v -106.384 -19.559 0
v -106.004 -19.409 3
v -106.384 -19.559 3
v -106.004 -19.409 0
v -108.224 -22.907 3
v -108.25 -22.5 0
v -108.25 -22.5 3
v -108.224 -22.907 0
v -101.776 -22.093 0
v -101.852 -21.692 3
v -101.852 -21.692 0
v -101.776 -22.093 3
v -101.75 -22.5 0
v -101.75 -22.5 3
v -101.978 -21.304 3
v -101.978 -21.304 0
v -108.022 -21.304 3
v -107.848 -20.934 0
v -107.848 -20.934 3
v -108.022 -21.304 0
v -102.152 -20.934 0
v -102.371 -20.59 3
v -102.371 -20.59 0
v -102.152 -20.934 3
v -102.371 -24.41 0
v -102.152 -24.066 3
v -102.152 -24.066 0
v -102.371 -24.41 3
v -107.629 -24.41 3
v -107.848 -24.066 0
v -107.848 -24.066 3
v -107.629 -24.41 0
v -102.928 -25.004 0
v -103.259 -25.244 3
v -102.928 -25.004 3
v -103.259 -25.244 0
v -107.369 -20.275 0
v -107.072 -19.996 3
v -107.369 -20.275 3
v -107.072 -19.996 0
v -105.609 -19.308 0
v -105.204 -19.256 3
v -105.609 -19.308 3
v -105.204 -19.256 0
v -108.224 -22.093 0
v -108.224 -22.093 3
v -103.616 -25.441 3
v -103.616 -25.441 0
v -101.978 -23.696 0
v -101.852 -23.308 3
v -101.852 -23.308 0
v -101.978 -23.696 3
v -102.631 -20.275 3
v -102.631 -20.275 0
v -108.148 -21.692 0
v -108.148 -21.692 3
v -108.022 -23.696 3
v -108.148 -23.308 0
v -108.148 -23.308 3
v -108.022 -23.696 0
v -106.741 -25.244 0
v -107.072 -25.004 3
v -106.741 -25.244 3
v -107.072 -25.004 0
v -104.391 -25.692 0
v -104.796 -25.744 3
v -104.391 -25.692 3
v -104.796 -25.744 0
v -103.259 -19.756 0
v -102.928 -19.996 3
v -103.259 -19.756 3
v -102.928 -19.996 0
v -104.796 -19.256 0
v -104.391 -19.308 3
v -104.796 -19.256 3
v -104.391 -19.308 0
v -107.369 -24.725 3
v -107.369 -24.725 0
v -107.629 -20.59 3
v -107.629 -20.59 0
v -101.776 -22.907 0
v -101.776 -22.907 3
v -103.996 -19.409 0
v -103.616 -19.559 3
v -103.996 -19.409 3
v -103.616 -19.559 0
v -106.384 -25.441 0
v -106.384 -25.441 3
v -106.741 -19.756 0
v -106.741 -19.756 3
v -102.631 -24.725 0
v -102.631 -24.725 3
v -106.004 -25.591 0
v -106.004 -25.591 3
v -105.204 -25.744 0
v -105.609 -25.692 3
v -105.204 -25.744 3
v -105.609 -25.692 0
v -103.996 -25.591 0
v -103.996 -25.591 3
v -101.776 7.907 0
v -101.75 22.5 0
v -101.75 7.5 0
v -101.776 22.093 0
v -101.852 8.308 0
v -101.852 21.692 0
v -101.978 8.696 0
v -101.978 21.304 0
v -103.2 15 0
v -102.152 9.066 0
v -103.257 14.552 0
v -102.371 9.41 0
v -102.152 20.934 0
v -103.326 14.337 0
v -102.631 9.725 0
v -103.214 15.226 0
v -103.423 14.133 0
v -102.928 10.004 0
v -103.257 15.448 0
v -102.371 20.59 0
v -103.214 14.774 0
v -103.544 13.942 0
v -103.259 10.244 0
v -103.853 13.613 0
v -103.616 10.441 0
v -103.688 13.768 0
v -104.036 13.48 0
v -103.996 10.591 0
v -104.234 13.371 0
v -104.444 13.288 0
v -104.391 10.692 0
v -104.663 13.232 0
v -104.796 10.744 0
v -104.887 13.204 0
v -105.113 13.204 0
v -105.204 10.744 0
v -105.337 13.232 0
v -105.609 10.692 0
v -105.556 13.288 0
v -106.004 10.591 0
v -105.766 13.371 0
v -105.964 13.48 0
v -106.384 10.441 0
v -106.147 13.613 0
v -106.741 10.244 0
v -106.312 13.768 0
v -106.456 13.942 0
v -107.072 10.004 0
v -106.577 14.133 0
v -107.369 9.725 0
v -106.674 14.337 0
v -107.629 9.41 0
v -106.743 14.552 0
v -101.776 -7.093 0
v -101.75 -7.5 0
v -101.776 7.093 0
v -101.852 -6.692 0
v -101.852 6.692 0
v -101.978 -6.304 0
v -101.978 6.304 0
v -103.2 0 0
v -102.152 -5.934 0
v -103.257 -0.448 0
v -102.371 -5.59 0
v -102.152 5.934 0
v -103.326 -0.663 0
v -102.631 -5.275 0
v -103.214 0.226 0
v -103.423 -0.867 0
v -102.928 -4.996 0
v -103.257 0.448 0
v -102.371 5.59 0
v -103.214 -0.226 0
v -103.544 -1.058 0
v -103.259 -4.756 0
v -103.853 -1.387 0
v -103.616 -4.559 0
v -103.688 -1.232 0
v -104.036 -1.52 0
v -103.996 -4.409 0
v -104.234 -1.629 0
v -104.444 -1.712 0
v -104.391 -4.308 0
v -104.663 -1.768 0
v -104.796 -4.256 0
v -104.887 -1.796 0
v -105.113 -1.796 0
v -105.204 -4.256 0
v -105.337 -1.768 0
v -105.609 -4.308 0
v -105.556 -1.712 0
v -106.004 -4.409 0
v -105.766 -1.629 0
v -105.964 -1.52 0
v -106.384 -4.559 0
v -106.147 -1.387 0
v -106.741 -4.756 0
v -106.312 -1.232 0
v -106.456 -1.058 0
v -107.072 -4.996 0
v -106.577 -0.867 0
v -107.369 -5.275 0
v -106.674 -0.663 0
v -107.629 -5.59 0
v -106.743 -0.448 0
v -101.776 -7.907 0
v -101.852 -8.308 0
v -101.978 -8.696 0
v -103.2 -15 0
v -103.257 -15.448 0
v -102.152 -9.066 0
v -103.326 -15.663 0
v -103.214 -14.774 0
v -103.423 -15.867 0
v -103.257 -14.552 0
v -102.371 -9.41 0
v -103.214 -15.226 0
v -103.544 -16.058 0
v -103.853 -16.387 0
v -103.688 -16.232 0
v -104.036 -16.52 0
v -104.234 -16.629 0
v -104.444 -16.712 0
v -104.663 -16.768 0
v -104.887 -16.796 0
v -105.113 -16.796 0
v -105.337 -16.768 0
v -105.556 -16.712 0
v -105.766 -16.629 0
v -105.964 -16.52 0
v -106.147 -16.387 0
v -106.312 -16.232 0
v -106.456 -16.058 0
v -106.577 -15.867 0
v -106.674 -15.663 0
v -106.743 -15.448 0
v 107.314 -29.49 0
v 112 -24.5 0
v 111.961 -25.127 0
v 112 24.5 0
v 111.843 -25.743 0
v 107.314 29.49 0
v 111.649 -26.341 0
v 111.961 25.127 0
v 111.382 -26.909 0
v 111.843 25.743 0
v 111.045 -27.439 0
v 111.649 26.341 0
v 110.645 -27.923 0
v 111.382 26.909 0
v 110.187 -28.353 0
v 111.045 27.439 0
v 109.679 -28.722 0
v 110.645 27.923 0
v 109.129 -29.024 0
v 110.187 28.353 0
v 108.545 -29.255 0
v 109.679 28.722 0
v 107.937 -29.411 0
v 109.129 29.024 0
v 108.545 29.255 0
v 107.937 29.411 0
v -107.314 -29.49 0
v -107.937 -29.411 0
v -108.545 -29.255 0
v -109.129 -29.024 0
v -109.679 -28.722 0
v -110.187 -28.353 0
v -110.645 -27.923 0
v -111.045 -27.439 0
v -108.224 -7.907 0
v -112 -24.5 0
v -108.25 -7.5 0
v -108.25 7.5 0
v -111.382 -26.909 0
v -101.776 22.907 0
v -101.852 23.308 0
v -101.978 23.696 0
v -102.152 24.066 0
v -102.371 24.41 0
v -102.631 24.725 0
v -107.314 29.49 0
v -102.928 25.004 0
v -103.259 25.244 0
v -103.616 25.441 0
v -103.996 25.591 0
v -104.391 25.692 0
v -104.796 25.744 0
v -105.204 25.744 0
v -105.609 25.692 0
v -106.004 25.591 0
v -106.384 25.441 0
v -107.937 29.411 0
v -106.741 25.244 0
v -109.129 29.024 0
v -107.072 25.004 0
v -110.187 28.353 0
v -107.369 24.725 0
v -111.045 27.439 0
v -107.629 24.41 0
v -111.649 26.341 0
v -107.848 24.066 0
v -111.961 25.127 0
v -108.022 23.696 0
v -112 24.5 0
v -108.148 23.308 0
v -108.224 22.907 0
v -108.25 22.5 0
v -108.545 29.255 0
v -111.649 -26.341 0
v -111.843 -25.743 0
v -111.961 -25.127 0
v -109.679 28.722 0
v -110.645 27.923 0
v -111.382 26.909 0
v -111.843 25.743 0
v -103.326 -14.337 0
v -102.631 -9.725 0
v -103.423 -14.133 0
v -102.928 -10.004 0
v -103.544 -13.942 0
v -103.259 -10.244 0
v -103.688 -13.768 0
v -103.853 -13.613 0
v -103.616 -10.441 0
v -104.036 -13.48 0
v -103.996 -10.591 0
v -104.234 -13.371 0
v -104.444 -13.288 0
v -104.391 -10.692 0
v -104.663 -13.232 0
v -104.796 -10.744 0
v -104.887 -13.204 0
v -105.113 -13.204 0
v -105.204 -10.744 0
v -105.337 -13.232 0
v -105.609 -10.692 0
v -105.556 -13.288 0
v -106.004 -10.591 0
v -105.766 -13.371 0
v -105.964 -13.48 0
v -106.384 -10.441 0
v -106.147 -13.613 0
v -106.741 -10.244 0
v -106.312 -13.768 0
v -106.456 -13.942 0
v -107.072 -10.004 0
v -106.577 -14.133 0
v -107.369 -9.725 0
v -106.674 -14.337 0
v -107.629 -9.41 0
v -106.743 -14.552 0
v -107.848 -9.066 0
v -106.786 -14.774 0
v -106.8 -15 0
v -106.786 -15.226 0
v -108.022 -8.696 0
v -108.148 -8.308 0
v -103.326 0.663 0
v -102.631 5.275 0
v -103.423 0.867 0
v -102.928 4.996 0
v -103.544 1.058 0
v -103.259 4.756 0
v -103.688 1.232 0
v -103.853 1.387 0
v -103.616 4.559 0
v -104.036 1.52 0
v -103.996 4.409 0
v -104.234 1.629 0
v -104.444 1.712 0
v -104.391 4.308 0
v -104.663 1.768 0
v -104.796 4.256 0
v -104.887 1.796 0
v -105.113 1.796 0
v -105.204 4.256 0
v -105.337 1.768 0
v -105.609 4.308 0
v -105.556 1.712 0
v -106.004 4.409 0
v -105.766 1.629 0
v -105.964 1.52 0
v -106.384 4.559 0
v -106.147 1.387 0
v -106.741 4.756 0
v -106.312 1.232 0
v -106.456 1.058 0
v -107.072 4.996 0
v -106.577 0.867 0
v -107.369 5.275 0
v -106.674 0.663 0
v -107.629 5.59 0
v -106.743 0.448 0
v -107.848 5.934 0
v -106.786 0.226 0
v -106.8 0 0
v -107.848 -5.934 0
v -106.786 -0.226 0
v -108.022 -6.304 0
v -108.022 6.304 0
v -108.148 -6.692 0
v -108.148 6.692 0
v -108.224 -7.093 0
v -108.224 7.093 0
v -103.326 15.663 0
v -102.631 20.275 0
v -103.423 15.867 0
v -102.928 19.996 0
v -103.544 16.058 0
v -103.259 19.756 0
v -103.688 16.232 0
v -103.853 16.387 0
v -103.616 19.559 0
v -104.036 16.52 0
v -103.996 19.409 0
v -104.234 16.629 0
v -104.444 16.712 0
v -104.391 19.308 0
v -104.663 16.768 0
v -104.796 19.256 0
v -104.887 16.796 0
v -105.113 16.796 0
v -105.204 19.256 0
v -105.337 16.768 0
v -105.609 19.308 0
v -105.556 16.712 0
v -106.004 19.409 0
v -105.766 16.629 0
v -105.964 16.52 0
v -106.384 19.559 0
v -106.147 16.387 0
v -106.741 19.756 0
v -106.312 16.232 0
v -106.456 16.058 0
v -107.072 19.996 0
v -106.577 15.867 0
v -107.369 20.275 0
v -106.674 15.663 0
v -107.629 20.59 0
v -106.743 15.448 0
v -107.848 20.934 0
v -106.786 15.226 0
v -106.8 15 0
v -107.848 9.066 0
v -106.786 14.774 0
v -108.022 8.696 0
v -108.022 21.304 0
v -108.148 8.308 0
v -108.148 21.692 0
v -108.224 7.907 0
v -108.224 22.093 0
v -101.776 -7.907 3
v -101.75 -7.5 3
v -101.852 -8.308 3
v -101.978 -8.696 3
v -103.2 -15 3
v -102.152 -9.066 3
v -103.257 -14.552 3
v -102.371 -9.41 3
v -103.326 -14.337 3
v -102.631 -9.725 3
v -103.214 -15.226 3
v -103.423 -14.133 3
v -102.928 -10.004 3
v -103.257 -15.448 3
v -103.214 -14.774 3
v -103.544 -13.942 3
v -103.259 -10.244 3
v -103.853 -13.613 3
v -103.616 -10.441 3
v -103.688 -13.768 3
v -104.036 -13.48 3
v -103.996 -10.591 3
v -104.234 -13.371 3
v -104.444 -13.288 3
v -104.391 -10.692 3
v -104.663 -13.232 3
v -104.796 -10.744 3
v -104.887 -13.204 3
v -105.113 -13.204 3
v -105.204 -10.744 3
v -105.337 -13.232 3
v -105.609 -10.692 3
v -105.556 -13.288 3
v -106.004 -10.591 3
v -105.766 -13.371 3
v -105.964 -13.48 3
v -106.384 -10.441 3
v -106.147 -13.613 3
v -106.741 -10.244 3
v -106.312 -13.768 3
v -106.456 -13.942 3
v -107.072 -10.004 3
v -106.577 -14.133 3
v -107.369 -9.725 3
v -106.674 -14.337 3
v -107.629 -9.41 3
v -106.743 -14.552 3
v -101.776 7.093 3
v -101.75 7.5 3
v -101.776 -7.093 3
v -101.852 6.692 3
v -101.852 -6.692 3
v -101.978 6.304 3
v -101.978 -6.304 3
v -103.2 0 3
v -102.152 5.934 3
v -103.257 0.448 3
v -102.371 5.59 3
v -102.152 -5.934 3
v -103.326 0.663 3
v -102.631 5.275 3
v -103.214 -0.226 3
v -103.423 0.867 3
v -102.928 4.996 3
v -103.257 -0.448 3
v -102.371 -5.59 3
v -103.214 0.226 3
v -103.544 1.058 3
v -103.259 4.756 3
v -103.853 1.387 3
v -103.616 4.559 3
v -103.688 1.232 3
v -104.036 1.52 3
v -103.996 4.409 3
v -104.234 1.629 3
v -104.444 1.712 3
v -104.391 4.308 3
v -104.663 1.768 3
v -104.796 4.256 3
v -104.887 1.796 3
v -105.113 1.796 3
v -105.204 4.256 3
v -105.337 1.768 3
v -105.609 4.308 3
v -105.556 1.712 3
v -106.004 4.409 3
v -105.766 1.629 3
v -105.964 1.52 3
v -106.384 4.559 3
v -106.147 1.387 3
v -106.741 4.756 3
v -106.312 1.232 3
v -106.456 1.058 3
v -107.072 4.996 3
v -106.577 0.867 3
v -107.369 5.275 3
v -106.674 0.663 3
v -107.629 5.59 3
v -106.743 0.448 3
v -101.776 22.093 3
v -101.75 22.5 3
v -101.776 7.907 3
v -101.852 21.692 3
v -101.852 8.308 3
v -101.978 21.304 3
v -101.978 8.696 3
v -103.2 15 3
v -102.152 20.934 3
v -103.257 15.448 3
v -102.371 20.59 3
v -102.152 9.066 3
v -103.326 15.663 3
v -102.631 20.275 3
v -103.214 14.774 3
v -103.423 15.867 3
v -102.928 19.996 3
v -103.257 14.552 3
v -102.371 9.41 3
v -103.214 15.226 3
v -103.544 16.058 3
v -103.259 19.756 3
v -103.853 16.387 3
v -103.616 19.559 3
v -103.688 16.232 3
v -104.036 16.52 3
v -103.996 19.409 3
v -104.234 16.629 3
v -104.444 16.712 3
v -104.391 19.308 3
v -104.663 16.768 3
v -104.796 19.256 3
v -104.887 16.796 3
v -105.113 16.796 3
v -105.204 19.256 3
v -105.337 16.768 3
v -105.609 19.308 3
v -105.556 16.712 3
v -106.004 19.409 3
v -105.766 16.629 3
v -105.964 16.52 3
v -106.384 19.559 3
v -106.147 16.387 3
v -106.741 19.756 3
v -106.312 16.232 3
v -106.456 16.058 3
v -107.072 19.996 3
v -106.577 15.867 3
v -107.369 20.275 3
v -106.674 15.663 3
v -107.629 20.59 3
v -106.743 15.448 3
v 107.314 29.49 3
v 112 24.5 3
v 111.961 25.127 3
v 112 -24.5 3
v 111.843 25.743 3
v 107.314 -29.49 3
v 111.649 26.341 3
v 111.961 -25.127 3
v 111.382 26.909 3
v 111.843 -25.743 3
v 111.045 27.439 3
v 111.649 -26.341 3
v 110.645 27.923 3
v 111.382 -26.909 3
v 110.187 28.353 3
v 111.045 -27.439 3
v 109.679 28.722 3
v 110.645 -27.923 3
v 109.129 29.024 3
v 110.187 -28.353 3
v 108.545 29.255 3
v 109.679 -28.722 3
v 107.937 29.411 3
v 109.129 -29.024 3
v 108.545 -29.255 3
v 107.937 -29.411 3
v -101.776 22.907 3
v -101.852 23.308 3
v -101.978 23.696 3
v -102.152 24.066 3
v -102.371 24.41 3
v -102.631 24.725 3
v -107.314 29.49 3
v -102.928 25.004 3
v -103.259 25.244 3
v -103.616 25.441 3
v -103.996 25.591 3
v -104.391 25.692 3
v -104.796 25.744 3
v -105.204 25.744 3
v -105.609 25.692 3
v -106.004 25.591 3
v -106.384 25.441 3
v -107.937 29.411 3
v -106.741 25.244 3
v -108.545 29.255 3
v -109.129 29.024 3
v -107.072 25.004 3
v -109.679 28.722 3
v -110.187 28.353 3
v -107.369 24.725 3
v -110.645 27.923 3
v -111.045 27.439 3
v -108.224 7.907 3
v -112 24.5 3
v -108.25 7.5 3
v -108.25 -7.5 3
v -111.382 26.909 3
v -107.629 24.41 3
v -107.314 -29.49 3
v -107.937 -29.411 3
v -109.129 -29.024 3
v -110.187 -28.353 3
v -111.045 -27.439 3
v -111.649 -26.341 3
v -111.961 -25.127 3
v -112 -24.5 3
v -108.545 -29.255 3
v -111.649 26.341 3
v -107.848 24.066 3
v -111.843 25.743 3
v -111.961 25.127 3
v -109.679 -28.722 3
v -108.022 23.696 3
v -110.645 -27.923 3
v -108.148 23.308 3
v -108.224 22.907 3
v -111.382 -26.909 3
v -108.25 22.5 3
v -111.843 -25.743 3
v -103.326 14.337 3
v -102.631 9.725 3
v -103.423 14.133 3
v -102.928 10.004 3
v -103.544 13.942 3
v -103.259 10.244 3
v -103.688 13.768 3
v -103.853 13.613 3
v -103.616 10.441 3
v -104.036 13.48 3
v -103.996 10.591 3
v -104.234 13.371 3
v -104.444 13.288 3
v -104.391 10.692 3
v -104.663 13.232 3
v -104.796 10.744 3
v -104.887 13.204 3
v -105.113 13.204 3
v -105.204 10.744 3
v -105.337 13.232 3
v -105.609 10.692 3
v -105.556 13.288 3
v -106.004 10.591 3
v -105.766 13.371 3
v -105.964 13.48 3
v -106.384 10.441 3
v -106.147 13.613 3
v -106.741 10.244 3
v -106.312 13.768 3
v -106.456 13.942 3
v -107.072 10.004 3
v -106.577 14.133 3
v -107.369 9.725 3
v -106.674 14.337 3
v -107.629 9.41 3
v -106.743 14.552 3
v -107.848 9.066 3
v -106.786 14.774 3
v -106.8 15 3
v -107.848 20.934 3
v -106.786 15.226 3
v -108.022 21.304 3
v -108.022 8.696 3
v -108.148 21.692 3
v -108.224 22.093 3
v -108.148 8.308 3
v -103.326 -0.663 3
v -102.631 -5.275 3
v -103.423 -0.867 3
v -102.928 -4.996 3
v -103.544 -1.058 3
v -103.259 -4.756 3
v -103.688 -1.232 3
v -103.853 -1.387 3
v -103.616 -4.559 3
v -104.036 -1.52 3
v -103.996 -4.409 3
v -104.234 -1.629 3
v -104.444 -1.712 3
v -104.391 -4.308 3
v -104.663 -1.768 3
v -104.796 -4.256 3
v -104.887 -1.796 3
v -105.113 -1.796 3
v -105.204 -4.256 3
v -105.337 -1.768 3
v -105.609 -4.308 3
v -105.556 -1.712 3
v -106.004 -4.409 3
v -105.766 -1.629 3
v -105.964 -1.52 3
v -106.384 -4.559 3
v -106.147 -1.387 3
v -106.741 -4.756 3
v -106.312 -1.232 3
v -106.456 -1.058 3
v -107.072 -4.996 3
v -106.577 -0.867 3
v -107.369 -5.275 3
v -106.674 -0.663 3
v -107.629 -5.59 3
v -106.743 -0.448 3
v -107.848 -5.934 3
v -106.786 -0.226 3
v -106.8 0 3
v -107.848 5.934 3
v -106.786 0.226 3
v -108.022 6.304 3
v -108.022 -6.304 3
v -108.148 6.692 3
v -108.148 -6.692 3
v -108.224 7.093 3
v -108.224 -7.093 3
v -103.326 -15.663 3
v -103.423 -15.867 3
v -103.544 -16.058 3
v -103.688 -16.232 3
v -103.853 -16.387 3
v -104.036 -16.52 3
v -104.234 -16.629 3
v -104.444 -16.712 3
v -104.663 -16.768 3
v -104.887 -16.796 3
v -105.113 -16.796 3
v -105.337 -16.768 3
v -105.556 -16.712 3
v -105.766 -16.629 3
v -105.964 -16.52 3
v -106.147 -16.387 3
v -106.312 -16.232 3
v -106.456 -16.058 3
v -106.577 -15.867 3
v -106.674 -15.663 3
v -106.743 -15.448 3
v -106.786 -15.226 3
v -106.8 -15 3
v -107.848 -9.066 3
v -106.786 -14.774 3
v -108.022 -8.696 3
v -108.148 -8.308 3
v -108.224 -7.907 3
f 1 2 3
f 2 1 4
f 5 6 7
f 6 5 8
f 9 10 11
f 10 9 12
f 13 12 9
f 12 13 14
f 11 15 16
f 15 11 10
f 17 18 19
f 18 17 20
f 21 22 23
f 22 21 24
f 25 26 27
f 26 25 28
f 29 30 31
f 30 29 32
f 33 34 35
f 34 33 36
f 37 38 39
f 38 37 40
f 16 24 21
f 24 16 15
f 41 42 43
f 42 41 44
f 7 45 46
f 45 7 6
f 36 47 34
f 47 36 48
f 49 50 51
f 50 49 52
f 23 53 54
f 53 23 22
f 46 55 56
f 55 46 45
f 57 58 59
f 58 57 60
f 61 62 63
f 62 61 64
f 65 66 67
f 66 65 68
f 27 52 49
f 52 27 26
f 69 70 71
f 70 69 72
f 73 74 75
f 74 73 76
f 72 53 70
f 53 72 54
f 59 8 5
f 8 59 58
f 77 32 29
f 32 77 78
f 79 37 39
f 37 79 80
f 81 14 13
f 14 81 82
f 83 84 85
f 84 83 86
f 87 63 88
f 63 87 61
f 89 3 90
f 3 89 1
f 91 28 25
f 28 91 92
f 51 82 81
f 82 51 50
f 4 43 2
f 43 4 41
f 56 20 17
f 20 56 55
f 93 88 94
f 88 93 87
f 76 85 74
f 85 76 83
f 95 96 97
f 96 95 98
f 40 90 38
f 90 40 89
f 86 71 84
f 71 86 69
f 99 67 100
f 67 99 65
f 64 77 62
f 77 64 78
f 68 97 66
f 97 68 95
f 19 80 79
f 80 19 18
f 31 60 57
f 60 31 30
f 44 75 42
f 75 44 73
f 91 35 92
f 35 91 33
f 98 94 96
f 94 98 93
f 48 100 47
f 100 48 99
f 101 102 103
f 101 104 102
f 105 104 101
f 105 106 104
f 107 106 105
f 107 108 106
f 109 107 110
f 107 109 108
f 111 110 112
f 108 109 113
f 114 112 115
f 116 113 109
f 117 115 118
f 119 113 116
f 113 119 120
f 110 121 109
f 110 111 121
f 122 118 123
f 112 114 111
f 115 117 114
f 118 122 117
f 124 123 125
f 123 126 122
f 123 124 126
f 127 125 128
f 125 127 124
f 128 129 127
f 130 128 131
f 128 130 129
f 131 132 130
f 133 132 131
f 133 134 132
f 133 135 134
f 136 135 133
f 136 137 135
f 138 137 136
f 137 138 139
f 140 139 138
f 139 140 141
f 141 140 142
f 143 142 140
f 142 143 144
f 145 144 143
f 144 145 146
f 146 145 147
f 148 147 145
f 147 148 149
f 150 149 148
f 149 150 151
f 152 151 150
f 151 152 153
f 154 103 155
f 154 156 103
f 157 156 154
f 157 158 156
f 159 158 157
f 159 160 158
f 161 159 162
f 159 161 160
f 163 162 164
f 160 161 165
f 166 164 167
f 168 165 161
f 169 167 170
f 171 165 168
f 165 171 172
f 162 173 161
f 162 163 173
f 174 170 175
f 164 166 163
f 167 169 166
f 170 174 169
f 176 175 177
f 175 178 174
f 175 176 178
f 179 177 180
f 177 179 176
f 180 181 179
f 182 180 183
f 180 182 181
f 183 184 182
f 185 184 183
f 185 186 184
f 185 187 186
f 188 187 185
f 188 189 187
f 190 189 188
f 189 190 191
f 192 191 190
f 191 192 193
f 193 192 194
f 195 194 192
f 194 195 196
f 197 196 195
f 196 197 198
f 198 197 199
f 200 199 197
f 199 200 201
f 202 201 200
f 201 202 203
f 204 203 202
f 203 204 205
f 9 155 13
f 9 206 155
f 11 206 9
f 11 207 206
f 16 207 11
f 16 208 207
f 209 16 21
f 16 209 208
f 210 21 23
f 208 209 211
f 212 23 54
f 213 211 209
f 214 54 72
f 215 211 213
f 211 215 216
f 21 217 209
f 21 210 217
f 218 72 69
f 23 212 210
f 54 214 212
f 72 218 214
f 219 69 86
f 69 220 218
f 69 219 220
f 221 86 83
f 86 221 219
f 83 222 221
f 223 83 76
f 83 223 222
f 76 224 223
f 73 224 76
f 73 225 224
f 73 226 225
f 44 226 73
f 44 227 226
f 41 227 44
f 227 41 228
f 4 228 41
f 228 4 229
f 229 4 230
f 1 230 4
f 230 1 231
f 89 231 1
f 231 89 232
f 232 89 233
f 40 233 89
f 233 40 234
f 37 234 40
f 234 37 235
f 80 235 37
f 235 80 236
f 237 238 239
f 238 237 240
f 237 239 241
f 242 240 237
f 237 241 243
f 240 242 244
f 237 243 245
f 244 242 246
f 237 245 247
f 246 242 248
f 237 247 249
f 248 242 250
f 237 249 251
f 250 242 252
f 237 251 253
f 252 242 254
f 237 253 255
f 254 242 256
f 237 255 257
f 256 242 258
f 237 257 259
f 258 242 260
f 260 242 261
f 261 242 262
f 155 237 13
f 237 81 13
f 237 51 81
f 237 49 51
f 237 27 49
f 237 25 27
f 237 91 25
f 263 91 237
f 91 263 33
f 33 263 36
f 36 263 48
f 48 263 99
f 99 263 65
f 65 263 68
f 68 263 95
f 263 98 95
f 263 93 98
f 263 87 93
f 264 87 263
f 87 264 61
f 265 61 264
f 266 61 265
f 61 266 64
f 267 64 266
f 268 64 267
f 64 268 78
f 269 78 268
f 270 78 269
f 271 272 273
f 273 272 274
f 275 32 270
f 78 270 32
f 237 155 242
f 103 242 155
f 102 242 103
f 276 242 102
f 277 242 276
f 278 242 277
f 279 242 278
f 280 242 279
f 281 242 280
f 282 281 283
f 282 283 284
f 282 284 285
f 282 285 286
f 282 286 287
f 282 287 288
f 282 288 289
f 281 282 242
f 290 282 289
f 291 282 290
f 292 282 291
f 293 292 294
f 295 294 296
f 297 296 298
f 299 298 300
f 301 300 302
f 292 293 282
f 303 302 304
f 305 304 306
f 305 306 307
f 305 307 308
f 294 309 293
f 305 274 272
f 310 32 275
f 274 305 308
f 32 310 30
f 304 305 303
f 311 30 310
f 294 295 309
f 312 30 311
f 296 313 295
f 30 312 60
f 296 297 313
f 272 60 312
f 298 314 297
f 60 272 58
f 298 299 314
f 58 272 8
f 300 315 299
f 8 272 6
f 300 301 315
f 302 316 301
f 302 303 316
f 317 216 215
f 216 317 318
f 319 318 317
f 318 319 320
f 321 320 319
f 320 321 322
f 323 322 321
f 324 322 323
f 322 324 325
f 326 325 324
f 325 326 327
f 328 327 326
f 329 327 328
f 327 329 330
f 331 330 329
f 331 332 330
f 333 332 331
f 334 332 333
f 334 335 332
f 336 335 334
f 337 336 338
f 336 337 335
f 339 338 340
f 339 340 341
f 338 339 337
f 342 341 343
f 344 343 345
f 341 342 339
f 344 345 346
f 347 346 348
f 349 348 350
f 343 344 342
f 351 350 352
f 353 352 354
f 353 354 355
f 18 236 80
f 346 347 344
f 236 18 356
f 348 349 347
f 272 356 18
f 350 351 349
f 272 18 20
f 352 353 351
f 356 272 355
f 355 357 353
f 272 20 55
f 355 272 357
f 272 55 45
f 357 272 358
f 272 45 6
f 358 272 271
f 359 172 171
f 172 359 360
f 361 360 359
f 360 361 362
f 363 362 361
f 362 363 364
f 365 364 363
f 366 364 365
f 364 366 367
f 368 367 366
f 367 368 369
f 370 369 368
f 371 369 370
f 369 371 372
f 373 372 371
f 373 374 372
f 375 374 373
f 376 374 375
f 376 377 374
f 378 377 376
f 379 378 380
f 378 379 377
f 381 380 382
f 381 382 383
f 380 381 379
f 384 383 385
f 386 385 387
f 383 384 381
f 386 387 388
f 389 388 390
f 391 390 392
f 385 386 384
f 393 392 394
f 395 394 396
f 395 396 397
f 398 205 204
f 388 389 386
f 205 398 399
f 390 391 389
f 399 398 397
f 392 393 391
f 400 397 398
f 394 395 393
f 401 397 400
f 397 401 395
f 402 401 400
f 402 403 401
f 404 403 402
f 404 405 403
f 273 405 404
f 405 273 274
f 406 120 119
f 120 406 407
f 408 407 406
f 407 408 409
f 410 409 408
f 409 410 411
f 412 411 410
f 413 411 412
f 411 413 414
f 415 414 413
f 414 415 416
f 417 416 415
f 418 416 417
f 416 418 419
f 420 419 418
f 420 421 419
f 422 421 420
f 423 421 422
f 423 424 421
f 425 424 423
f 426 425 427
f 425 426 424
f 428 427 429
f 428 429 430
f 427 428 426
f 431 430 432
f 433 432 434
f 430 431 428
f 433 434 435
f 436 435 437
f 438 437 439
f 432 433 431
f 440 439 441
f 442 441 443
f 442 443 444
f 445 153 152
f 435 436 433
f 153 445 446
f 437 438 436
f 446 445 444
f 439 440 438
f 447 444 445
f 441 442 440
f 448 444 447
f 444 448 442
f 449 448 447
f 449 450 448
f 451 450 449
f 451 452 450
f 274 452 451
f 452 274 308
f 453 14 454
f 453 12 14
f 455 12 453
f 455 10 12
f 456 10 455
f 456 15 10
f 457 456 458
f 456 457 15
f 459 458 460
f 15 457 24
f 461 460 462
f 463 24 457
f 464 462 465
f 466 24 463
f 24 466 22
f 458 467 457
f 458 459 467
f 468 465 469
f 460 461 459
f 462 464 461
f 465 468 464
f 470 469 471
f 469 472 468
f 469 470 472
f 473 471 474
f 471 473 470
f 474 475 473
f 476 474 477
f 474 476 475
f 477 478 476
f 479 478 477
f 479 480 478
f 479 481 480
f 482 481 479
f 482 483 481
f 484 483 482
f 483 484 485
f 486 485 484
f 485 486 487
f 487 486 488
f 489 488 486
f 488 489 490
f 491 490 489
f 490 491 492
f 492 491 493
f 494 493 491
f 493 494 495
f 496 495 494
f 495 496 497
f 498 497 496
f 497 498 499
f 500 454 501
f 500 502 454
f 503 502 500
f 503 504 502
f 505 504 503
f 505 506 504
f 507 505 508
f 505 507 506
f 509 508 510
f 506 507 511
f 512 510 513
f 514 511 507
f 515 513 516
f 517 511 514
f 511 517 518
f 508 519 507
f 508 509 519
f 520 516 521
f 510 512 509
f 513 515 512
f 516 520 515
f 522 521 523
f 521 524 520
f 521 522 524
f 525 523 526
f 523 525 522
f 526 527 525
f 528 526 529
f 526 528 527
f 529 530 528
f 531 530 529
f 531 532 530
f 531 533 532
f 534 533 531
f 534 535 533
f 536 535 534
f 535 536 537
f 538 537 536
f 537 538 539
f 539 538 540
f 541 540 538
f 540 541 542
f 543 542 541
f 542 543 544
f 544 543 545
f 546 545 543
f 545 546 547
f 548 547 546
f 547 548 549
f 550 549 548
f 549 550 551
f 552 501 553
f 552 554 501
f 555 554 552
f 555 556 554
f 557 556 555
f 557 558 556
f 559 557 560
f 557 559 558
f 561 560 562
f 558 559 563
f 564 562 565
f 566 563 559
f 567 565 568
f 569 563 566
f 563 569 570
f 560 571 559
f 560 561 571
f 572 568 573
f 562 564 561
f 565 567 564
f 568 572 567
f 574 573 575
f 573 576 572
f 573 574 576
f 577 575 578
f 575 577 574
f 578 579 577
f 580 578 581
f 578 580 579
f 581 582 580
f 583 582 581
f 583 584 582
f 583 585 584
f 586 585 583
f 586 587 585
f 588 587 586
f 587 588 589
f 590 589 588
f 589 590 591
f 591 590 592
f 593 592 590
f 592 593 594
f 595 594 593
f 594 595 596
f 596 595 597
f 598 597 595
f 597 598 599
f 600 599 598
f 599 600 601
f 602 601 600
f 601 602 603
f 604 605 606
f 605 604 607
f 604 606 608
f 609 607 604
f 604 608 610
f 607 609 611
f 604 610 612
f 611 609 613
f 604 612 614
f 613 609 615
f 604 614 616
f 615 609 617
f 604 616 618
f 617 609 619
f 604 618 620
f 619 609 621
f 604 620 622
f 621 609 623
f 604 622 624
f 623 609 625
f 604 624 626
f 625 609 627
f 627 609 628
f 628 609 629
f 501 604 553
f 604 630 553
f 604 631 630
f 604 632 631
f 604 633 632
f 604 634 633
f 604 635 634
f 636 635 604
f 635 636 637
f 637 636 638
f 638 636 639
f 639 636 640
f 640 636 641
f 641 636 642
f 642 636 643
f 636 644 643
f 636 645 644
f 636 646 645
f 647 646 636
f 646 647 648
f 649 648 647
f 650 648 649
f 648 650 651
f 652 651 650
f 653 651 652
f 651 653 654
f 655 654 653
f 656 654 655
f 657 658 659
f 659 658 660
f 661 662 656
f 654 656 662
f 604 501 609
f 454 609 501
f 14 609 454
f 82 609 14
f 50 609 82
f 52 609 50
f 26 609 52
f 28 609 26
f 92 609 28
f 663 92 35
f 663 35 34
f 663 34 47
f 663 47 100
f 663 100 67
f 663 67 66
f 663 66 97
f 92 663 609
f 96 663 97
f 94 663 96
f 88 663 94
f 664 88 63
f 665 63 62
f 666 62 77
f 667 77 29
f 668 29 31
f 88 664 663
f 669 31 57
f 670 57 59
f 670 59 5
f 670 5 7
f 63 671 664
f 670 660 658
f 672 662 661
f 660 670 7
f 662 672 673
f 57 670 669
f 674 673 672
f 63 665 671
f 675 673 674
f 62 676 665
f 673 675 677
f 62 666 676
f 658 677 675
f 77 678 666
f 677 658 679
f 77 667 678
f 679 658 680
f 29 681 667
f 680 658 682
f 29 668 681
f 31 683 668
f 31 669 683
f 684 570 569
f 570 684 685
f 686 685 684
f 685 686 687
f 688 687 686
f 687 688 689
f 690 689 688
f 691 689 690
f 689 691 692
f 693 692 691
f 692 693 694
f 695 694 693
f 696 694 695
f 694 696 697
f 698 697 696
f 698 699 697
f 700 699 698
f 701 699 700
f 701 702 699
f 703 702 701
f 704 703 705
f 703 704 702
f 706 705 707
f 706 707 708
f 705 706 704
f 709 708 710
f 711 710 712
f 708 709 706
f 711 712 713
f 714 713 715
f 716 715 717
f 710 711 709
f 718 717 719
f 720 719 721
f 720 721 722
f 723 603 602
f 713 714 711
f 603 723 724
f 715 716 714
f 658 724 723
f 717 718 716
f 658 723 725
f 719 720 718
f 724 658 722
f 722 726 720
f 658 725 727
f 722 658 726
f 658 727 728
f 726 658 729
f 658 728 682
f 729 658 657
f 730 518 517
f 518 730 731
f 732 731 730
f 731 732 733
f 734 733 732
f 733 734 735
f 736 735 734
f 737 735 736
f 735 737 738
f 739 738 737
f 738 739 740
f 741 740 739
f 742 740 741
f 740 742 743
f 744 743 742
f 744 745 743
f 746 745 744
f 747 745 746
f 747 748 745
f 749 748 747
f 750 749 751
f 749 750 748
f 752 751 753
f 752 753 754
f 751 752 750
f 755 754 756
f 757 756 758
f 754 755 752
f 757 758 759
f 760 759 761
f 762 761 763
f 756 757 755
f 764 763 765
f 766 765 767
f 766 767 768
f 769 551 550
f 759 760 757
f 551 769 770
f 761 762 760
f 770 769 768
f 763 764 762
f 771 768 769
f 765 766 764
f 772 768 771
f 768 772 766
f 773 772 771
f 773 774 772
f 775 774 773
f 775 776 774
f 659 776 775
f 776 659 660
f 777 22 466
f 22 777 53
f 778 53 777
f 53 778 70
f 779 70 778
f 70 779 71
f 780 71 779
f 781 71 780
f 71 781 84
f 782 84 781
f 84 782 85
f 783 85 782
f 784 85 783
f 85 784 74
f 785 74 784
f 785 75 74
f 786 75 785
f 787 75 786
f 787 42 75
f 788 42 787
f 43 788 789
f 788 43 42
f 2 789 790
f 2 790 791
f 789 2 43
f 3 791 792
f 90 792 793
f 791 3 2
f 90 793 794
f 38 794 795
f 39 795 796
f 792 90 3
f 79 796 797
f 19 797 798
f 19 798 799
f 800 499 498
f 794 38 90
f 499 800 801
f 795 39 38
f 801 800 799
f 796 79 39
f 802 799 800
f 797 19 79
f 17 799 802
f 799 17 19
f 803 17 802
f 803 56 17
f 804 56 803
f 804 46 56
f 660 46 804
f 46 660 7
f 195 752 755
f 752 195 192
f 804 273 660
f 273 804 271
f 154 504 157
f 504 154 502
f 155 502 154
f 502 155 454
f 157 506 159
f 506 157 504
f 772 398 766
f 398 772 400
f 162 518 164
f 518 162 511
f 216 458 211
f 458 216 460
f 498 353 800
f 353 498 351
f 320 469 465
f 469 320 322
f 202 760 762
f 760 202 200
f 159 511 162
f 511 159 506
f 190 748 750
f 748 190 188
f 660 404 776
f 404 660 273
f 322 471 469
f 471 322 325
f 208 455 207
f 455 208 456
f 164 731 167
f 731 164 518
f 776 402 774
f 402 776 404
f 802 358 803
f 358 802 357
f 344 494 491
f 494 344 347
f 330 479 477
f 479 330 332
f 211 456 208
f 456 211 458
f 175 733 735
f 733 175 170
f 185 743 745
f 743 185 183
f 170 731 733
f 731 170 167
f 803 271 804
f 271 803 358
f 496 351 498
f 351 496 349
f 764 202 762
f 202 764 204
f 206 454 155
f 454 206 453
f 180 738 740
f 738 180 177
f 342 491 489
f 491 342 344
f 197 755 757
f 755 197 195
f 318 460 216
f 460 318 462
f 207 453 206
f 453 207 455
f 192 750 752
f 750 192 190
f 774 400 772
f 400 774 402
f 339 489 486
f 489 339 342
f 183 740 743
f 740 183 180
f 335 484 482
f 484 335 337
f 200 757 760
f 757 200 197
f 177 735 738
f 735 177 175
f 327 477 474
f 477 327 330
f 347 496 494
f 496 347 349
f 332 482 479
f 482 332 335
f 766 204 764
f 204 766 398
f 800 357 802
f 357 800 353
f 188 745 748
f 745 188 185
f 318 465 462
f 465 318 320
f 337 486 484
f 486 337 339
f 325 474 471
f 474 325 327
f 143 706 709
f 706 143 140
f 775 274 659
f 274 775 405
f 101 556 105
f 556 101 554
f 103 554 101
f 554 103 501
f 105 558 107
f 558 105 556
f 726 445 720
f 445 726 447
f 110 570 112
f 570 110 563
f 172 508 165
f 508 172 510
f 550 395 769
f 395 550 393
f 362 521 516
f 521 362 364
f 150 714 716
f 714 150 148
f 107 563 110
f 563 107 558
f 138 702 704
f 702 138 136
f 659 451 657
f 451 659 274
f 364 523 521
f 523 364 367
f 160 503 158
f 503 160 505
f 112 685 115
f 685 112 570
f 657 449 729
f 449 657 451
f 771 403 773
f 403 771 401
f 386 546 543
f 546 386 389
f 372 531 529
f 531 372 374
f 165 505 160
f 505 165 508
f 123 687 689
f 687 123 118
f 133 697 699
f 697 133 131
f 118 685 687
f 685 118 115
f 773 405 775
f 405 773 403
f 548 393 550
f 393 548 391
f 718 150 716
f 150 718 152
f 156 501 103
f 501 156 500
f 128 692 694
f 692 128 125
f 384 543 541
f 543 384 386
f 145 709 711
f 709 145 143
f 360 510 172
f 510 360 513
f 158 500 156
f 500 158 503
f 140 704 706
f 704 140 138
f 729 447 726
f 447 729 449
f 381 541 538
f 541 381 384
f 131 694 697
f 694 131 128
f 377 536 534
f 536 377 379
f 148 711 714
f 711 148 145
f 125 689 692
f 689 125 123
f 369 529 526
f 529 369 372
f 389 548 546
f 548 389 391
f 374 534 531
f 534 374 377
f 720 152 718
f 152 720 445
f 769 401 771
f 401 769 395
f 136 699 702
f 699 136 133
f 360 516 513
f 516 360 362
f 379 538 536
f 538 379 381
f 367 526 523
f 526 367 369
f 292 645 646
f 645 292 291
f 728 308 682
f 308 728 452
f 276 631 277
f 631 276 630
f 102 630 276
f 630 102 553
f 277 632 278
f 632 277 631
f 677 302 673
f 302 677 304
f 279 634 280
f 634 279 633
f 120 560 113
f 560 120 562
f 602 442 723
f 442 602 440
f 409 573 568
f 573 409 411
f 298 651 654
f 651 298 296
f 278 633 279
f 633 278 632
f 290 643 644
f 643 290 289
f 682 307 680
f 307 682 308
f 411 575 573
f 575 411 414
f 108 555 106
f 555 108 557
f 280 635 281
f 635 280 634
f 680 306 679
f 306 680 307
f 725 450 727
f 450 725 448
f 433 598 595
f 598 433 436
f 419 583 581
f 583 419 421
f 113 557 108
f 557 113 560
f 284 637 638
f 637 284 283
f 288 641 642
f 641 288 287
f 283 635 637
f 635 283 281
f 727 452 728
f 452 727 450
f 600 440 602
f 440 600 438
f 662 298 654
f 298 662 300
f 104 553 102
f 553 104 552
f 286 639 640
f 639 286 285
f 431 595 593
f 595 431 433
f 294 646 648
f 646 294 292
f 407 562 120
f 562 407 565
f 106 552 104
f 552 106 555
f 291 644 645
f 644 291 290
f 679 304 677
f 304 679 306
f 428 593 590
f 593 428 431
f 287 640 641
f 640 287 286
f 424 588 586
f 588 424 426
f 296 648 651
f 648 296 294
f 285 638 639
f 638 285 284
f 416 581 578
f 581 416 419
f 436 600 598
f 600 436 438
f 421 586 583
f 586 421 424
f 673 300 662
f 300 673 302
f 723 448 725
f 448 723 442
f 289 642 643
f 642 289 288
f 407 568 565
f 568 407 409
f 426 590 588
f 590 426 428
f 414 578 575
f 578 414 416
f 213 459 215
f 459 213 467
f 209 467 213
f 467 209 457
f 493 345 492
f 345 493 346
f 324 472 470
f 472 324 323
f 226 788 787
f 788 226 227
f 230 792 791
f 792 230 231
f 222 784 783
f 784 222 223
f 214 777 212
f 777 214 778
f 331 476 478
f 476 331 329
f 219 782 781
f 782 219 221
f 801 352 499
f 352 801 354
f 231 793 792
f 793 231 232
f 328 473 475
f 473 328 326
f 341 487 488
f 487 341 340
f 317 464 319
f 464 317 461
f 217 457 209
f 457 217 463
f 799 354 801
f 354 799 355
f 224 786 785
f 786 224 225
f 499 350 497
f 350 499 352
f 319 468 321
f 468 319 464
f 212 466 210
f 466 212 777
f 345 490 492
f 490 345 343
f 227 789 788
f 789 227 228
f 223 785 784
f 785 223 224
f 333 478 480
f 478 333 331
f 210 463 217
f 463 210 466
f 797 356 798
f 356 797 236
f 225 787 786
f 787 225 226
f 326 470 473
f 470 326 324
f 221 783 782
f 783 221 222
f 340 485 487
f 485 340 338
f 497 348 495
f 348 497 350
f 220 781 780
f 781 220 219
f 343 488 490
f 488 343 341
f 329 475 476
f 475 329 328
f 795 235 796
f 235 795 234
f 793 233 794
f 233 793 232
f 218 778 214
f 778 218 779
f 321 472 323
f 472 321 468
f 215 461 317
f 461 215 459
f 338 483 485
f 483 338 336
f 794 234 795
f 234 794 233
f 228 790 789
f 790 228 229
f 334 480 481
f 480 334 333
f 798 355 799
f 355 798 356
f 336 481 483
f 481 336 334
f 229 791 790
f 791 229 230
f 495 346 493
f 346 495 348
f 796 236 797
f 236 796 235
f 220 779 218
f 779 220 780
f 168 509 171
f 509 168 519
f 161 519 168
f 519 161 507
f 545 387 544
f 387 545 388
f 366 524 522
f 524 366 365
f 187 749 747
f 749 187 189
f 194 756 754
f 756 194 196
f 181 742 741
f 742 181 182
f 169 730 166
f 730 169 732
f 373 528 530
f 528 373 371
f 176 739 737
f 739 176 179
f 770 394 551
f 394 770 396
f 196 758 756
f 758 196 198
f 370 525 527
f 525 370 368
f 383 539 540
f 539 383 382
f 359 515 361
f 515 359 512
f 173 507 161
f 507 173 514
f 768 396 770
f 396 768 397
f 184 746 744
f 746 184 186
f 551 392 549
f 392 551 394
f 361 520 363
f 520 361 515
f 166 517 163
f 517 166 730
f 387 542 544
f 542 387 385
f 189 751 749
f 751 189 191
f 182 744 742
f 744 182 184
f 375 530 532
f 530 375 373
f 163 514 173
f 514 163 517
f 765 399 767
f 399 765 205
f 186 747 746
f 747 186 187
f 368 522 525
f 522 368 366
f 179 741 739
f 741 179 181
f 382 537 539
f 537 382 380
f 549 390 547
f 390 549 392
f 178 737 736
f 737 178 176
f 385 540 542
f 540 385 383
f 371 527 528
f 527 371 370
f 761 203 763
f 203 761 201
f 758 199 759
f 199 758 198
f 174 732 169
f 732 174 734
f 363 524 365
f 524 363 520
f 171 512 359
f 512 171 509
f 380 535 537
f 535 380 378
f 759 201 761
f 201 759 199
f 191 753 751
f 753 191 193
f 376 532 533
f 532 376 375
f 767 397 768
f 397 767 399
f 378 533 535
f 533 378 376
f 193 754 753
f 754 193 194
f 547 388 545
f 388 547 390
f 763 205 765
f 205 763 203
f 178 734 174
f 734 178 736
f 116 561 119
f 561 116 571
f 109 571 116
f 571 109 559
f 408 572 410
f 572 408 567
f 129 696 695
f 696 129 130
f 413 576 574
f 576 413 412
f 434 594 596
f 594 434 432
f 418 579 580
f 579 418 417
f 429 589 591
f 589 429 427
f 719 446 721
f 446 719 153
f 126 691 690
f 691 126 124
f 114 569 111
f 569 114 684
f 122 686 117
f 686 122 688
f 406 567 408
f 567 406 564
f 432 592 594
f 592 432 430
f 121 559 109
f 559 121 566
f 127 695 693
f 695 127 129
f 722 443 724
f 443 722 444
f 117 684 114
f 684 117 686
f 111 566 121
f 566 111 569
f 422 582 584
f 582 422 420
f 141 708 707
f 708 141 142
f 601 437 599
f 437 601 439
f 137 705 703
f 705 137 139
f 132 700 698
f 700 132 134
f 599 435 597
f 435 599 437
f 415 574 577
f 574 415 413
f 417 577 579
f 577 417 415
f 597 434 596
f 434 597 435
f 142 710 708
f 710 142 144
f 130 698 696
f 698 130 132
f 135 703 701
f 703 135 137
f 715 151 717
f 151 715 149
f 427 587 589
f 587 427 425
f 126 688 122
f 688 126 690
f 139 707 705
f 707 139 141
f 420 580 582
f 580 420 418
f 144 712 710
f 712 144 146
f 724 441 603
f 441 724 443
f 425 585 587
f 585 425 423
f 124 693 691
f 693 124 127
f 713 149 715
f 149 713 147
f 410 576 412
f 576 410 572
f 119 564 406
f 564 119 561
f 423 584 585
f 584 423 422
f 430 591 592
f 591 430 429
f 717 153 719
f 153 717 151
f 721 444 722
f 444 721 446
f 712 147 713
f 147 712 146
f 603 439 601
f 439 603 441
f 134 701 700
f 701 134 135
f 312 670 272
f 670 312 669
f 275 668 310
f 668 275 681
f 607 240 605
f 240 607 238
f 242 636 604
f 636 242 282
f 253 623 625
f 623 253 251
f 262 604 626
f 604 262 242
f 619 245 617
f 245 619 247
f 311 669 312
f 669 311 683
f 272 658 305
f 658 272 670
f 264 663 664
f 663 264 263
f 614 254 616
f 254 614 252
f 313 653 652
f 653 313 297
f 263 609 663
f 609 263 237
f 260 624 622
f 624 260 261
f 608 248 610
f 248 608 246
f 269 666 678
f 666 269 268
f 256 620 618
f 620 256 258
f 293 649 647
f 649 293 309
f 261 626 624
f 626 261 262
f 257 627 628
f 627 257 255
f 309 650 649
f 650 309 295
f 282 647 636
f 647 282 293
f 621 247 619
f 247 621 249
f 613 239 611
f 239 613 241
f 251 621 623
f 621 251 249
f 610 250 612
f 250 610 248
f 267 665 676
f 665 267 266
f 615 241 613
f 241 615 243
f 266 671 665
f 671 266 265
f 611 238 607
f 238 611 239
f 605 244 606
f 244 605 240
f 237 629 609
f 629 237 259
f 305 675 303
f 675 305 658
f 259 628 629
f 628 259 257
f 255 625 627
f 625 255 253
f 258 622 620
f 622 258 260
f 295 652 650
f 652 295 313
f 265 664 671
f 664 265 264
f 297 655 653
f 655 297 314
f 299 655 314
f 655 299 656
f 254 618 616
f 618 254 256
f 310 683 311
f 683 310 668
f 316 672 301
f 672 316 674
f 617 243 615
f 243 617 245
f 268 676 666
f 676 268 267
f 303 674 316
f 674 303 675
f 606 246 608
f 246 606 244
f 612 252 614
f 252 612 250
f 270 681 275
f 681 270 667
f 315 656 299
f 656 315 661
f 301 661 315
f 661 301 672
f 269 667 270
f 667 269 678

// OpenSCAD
$fn = 50;


difference() {
	union() {
		hull() {
			translate(v = [-107.0000000000, 24.5000000000, 0]) {
				cylinder(h = 3, r = 5);
			}
			translate(v = [107.0000000000, 24.5000000000, 0]) {
				cylinder(h = 3, r = 5);
			}
			translate(v = [-107.0000000000, -24.5000000000, 0]) {
				cylinder(h = 3, r = 5);
			}
			translate(v = [107.0000000000, -24.5000000000, 0]) {
				cylinder(h = 3, r = 5);
			}
		}
	}
	union() {
		translate(v = [-105.0000000000, -22.5000000000, 0]) {
			cylinder(h = 3, r = 3.2500000000);
		}
		translate(v = [-105.0000000000, -7.5000000000, 0]) {
			cylinder(h = 3, r = 3.2500000000);
		}
		translate(v = [-105.0000000000, 7.5000000000, 0]) {
			cylinder(h = 3, r = 3.2500000000);
		}
		translate(v = [-105.0000000000, 22.5000000000, 0]) {
			cylinder(h = 3, r = 3.2500000000);
		}
		translate(v = [-105.0000000000, -22.5000000000, 0]) {
			cylinder(h = 3, r = 1.8000000000);
		}
		translate(v = [-105.0000000000, -15.0000000000, 0]) {
			cylinder(h = 3, r = 1.8000000000);
		}
		translate(v = [-105.0000000000, -7.5000000000, 0]) {
			cylinder(h = 3, r = 1.8000000000);
		}
		translate(v = [-105.0000000000, 0.0000000000, 0]) {
			cylinder(h = 3, r = 1.8000000000);
		}
		translate(v = [-105.0000000000, 7.5000000000, 0]) {
			cylinder(h = 3, r = 1.8000000000);
		}
		translate(v = [-105.0000000000, 15.0000000000, 0]) {
			cylinder(h = 3, r = 1.8000000000);
		}
		translate(v = [-105.0000000000, 22.5000000000, 0]) {
			cylinder(h = 3, r = 1.8000000000);
		}
		translate(v = [-105.0000000000, -22.5000000000, 0]) {
			cylinder(h = 3, r = 1.8000000000);
		}
		translate(v = [-105.0000000000, -15.0000000000, 0]) {
			cylinder(h = 3, r = 1.8000000000);
		}
		translate(v = [-105.0000000000, -7.5000000000, 0]) {
			cylinder(h = 3, r = 1.8000000000);
		}
		translate(v = [-105.0000000000, 0.0000000000, 0]) {
			cylinder(h = 3, r = 1.8000000000);
		}
		translate(v = [-105.0000000000, 7.5000000000, 0]) {
			cylinder(h = 3, r = 1.8000000000);
		}
		translate(v = [-105.0000000000, 15.0000000000, 0]) {
			cylinder(h = 3, r = 1.8000000000);
		}
		translate(v = [-105.0000000000, 22.5000000000, 0]) {
			cylinder(h = 3, r = 1.8000000000);
		}
		translate(v = [-105.0000000000, -22.5000000000, 0]) {
			cylinder(h = 3, r = 1.8000000000);
		}
		translate(v = [-105.0000000000, -15.0000000000, 0]) {
			cylinder(h = 3, r = 1.8000000000);
		}
		translate(v = [-105.0000000000, -7.5000000000, 0]) {
			cylinder(h = 3, r = 1.8000000000);
		}
		translate(v = [-105.0000000000, 0.0000000000, 0]) {
			cylinder(h = 3, r = 1.8000000000);
		}
		translate(v = [-105.0000000000, 7.5000000000, 0]) {
			cylinder(h = 3, r = 1.8000000000);
		}
		translate(v = [-105.0000000000, 15.0000000000, 0]) {
			cylinder(h = 3, r = 1.8000000000);
		}
		translate(v = [-105.0000000000, 22.5000000000, 0]) {
			cylinder(h = 3, r = 1.8000000000);
		}
	}
}
